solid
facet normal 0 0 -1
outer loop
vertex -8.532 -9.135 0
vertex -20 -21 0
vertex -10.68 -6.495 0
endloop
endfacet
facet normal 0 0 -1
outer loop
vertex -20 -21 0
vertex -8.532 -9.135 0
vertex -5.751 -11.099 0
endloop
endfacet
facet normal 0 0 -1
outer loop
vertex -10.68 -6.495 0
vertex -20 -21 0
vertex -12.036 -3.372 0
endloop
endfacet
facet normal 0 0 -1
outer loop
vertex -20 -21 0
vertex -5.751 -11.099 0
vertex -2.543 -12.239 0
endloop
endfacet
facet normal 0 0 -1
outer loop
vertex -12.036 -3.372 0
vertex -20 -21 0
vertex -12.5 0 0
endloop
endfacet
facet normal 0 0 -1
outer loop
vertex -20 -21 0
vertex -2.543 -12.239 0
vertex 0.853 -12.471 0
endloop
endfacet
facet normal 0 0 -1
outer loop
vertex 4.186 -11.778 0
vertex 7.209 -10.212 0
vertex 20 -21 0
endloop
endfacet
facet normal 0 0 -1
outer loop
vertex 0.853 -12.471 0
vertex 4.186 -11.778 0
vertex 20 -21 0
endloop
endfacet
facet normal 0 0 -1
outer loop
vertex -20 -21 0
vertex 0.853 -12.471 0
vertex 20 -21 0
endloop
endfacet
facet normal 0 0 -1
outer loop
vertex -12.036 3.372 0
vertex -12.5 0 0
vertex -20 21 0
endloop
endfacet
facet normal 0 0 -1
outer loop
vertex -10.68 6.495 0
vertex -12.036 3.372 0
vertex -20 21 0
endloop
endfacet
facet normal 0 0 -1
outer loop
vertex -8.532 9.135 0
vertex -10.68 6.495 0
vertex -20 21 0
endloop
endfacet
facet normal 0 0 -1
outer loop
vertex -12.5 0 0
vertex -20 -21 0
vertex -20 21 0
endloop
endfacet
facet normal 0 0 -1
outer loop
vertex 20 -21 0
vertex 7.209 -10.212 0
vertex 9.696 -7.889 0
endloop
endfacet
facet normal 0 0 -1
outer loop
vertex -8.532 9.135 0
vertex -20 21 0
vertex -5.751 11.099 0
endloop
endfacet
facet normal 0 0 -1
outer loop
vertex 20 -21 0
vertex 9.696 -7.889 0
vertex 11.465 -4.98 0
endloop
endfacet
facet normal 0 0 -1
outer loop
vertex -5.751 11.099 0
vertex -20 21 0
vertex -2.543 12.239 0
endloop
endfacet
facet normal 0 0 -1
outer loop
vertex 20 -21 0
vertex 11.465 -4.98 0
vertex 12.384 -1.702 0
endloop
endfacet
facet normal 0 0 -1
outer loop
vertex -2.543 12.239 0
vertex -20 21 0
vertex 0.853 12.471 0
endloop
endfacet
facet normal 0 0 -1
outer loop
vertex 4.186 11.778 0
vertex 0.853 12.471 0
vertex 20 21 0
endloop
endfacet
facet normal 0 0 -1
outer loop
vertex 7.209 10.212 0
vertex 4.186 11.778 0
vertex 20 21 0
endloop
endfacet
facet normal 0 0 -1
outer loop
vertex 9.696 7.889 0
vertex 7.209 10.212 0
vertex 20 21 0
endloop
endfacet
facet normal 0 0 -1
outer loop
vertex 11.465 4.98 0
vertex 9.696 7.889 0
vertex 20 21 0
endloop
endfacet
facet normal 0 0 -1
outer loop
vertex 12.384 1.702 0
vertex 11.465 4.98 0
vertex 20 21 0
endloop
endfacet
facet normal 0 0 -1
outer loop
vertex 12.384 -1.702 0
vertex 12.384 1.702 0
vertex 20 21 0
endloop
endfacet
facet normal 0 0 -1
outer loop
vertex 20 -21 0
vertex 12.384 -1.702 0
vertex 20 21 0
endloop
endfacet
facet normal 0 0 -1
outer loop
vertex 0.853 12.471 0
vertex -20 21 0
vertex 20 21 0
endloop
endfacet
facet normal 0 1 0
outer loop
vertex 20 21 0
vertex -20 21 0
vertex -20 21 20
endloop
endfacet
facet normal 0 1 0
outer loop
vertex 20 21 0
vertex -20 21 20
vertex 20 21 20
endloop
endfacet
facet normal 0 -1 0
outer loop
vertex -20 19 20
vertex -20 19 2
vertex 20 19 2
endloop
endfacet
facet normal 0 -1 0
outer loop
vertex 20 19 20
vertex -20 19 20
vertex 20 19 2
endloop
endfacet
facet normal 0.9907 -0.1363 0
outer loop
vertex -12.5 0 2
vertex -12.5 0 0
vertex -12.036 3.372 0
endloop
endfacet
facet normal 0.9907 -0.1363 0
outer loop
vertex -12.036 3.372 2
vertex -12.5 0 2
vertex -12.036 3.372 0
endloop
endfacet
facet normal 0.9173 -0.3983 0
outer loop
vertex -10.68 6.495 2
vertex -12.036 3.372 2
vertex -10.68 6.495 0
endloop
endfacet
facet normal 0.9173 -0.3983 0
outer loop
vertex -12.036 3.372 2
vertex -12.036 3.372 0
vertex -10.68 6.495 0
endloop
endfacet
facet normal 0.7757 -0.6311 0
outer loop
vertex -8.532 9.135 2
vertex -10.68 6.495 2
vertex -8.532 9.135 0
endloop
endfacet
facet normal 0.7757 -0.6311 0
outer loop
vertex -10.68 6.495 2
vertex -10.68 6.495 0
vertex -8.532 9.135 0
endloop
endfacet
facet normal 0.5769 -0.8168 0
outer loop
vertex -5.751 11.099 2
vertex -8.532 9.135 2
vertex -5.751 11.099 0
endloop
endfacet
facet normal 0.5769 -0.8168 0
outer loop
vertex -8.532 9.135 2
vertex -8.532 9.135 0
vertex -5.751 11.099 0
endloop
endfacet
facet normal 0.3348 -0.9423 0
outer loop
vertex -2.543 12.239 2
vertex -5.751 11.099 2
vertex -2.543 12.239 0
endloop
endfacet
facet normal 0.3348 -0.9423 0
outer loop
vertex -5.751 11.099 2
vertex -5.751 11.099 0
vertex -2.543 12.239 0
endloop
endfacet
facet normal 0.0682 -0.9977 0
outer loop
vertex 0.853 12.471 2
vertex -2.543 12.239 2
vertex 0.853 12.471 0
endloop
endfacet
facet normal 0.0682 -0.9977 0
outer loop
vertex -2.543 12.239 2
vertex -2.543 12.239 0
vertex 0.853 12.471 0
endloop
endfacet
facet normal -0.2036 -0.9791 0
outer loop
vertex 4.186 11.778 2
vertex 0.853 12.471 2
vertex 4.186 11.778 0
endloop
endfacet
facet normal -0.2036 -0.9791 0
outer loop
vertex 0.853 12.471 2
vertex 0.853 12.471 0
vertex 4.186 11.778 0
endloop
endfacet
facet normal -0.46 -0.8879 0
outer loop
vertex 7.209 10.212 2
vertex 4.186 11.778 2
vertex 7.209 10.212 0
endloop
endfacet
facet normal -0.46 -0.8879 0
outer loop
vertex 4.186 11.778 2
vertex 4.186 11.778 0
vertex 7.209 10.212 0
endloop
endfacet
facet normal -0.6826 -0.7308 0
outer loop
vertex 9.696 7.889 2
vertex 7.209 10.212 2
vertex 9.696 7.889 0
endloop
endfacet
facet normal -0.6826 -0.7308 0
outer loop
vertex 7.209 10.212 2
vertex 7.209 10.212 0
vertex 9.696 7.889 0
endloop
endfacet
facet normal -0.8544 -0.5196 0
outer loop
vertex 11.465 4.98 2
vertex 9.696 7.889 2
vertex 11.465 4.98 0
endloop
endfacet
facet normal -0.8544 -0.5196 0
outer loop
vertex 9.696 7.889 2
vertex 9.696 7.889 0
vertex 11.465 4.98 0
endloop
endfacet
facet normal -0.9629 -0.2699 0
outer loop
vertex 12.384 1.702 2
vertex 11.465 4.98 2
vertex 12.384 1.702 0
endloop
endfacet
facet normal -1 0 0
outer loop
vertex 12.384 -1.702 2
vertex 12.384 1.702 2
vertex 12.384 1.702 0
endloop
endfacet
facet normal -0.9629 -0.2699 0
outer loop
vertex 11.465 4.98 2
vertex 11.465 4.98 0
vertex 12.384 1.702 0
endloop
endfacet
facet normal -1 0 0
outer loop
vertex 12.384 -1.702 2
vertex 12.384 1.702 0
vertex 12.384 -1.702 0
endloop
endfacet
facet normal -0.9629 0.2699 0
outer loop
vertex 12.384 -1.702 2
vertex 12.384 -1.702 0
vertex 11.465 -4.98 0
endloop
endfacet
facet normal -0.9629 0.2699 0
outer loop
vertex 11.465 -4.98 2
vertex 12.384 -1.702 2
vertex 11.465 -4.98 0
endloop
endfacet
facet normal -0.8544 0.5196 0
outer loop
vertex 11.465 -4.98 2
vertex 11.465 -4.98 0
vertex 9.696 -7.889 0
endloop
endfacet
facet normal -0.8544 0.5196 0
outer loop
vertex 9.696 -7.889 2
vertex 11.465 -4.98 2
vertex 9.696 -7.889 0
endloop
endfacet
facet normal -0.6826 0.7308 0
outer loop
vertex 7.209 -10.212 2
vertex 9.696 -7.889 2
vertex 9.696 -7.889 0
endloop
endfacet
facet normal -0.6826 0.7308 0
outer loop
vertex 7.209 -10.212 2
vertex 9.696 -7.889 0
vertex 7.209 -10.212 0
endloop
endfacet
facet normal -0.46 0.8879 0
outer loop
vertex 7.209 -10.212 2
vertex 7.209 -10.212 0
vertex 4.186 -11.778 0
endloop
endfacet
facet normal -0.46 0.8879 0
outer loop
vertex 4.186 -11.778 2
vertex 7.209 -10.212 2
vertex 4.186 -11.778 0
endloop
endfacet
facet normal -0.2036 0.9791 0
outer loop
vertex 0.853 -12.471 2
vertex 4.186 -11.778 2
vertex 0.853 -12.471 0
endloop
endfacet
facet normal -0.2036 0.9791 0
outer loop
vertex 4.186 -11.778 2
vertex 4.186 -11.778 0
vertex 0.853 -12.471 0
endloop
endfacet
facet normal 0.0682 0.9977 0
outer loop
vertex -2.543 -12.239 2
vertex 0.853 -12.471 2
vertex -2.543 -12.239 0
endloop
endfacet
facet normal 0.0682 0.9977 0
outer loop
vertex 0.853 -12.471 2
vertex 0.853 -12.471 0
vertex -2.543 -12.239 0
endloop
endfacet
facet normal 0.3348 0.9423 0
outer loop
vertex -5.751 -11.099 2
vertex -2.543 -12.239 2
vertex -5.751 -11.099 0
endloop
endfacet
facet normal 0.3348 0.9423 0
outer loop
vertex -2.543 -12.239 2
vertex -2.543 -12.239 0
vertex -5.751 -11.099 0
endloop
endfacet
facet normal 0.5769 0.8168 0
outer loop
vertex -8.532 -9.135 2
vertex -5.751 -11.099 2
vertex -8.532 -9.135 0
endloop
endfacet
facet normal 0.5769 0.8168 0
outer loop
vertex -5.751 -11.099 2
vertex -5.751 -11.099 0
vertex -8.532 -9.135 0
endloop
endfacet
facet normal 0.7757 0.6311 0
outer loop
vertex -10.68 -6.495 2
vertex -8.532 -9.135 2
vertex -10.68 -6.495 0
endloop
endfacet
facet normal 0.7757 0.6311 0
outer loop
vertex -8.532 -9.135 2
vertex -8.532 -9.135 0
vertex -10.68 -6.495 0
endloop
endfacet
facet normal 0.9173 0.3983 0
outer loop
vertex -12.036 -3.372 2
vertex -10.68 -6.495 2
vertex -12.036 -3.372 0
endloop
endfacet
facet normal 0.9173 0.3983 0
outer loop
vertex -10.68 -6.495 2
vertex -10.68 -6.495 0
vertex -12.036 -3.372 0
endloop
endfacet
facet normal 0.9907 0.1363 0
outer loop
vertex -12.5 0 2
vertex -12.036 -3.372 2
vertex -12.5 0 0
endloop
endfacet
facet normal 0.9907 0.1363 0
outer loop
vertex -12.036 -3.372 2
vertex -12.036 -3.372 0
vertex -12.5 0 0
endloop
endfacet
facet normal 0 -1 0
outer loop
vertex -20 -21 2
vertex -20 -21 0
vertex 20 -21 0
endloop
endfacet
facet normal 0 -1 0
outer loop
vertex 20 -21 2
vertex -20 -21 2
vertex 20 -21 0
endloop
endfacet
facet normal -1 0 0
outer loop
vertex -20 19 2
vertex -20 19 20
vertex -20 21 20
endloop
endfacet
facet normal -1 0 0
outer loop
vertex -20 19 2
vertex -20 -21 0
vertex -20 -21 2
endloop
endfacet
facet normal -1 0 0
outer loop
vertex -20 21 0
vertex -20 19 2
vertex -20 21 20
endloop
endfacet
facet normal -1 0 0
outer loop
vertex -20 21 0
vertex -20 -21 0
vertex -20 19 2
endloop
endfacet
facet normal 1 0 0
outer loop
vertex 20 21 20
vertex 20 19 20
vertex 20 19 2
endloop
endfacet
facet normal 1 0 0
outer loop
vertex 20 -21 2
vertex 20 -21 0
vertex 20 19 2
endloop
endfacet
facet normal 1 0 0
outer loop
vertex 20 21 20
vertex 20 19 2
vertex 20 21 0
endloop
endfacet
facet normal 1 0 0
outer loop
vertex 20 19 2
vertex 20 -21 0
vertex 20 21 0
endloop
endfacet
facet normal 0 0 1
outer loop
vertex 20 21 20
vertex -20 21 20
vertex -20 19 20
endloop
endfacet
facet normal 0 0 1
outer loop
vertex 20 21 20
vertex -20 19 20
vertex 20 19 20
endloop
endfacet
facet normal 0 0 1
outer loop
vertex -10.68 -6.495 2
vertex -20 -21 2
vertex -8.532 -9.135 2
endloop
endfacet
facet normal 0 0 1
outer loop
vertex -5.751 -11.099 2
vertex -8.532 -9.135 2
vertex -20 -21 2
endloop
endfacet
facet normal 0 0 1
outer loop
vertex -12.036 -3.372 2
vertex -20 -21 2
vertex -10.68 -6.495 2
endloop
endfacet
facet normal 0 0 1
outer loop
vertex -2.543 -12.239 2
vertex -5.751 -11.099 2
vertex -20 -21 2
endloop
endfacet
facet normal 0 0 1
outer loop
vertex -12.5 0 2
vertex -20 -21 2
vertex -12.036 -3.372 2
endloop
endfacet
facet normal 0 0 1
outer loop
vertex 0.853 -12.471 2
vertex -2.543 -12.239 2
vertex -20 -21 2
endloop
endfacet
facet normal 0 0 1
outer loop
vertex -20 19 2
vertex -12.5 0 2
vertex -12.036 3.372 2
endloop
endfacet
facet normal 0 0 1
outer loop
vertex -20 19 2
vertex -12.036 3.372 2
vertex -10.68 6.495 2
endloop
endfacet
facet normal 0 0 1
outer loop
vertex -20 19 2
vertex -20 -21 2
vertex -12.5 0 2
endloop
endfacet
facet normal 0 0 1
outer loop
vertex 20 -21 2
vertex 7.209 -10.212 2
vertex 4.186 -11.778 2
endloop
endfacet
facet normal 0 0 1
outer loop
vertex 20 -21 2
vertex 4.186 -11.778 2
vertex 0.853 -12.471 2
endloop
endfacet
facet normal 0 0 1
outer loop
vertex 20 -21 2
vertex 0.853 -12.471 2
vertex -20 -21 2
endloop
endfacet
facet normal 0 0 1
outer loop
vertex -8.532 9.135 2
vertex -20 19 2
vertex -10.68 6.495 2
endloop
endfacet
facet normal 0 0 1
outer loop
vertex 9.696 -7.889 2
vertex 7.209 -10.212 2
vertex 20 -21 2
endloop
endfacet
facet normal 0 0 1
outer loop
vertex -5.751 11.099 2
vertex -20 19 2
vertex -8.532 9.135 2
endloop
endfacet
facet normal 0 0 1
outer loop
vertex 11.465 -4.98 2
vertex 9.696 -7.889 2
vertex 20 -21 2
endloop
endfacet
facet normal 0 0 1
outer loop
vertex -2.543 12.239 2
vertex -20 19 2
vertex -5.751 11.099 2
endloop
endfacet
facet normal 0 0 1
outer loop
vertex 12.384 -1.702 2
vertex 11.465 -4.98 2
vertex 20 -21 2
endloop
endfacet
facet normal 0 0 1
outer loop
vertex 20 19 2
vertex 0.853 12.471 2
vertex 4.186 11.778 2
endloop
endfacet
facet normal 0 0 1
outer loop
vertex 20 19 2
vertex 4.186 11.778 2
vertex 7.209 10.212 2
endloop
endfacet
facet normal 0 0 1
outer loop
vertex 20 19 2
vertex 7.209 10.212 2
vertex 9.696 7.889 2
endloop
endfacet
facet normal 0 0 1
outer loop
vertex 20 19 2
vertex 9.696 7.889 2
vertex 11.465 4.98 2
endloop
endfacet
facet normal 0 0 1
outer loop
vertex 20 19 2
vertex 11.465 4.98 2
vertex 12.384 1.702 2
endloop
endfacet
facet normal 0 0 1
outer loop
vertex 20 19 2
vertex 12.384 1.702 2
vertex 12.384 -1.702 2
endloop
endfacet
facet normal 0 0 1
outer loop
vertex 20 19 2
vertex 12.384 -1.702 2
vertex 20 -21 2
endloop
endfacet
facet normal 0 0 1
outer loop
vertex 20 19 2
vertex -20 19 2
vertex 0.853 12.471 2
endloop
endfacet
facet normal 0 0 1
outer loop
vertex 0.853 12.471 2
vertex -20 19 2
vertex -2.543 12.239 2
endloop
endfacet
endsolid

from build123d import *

# Parameters (mm, degrees)
SKETCH1_W           = 40
SKETCH1_H           = 42
SKETCH1_R           = 12.5
BOSS_EXTRUDE1_DEPTH = 2
SKETCH3_W           = 40
SKETCH3_H           = 2
BOSS_EXTRUDE2_DEPTH = 18
BOSS_EXTRUDE3_START = -2
SKETCH4_R           = 12.5
BOSS_EXTRUDE3_DEPTH = 2
SKETCH5_R           = 12.5
CUT_EXTRUDE1_DEPTH  = 2


with BuildPart() as part:
    # Sketch1 → Boss-Extrude1 (new body)
    with BuildSketch(Plane.XY):
        Rectangle(SKETCH1_W, SKETCH1_H)
        Circle(SKETCH1_R, mode=Mode.SUBTRACT)
    extrude(amount=BOSS_EXTRUDE1_DEPTH)

    # Sketch3 → Boss-Extrude2 (add)
    with BuildSketch(Plane.XY.offset(2)):
        with Locations((0, 20)):
            Rectangle(SKETCH3_W, SKETCH3_H)
    extrude(amount=BOSS_EXTRUDE2_DEPTH)

    # Sketch4 → Boss-Extrude3 (add)
    with BuildSketch(Plane.XY.offset(2).offset(BOSS_EXTRUDE3_START)):
        Circle(SKETCH4_R)
    extrude(amount=BOSS_EXTRUDE3_DEPTH)

    # Sketch5 → Cut-Extrude1 (cut)
    with BuildSketch(Plane(origin=(0, 0, 0), x_dir=(-1, 0, 0), z_dir=(0, 0, -1))):
        Circle(SKETCH5_R)
    extrude(amount=-CUT_EXTRUDE1_DEPTH, mode=Mode.SUBTRACT)


solid = part.part
